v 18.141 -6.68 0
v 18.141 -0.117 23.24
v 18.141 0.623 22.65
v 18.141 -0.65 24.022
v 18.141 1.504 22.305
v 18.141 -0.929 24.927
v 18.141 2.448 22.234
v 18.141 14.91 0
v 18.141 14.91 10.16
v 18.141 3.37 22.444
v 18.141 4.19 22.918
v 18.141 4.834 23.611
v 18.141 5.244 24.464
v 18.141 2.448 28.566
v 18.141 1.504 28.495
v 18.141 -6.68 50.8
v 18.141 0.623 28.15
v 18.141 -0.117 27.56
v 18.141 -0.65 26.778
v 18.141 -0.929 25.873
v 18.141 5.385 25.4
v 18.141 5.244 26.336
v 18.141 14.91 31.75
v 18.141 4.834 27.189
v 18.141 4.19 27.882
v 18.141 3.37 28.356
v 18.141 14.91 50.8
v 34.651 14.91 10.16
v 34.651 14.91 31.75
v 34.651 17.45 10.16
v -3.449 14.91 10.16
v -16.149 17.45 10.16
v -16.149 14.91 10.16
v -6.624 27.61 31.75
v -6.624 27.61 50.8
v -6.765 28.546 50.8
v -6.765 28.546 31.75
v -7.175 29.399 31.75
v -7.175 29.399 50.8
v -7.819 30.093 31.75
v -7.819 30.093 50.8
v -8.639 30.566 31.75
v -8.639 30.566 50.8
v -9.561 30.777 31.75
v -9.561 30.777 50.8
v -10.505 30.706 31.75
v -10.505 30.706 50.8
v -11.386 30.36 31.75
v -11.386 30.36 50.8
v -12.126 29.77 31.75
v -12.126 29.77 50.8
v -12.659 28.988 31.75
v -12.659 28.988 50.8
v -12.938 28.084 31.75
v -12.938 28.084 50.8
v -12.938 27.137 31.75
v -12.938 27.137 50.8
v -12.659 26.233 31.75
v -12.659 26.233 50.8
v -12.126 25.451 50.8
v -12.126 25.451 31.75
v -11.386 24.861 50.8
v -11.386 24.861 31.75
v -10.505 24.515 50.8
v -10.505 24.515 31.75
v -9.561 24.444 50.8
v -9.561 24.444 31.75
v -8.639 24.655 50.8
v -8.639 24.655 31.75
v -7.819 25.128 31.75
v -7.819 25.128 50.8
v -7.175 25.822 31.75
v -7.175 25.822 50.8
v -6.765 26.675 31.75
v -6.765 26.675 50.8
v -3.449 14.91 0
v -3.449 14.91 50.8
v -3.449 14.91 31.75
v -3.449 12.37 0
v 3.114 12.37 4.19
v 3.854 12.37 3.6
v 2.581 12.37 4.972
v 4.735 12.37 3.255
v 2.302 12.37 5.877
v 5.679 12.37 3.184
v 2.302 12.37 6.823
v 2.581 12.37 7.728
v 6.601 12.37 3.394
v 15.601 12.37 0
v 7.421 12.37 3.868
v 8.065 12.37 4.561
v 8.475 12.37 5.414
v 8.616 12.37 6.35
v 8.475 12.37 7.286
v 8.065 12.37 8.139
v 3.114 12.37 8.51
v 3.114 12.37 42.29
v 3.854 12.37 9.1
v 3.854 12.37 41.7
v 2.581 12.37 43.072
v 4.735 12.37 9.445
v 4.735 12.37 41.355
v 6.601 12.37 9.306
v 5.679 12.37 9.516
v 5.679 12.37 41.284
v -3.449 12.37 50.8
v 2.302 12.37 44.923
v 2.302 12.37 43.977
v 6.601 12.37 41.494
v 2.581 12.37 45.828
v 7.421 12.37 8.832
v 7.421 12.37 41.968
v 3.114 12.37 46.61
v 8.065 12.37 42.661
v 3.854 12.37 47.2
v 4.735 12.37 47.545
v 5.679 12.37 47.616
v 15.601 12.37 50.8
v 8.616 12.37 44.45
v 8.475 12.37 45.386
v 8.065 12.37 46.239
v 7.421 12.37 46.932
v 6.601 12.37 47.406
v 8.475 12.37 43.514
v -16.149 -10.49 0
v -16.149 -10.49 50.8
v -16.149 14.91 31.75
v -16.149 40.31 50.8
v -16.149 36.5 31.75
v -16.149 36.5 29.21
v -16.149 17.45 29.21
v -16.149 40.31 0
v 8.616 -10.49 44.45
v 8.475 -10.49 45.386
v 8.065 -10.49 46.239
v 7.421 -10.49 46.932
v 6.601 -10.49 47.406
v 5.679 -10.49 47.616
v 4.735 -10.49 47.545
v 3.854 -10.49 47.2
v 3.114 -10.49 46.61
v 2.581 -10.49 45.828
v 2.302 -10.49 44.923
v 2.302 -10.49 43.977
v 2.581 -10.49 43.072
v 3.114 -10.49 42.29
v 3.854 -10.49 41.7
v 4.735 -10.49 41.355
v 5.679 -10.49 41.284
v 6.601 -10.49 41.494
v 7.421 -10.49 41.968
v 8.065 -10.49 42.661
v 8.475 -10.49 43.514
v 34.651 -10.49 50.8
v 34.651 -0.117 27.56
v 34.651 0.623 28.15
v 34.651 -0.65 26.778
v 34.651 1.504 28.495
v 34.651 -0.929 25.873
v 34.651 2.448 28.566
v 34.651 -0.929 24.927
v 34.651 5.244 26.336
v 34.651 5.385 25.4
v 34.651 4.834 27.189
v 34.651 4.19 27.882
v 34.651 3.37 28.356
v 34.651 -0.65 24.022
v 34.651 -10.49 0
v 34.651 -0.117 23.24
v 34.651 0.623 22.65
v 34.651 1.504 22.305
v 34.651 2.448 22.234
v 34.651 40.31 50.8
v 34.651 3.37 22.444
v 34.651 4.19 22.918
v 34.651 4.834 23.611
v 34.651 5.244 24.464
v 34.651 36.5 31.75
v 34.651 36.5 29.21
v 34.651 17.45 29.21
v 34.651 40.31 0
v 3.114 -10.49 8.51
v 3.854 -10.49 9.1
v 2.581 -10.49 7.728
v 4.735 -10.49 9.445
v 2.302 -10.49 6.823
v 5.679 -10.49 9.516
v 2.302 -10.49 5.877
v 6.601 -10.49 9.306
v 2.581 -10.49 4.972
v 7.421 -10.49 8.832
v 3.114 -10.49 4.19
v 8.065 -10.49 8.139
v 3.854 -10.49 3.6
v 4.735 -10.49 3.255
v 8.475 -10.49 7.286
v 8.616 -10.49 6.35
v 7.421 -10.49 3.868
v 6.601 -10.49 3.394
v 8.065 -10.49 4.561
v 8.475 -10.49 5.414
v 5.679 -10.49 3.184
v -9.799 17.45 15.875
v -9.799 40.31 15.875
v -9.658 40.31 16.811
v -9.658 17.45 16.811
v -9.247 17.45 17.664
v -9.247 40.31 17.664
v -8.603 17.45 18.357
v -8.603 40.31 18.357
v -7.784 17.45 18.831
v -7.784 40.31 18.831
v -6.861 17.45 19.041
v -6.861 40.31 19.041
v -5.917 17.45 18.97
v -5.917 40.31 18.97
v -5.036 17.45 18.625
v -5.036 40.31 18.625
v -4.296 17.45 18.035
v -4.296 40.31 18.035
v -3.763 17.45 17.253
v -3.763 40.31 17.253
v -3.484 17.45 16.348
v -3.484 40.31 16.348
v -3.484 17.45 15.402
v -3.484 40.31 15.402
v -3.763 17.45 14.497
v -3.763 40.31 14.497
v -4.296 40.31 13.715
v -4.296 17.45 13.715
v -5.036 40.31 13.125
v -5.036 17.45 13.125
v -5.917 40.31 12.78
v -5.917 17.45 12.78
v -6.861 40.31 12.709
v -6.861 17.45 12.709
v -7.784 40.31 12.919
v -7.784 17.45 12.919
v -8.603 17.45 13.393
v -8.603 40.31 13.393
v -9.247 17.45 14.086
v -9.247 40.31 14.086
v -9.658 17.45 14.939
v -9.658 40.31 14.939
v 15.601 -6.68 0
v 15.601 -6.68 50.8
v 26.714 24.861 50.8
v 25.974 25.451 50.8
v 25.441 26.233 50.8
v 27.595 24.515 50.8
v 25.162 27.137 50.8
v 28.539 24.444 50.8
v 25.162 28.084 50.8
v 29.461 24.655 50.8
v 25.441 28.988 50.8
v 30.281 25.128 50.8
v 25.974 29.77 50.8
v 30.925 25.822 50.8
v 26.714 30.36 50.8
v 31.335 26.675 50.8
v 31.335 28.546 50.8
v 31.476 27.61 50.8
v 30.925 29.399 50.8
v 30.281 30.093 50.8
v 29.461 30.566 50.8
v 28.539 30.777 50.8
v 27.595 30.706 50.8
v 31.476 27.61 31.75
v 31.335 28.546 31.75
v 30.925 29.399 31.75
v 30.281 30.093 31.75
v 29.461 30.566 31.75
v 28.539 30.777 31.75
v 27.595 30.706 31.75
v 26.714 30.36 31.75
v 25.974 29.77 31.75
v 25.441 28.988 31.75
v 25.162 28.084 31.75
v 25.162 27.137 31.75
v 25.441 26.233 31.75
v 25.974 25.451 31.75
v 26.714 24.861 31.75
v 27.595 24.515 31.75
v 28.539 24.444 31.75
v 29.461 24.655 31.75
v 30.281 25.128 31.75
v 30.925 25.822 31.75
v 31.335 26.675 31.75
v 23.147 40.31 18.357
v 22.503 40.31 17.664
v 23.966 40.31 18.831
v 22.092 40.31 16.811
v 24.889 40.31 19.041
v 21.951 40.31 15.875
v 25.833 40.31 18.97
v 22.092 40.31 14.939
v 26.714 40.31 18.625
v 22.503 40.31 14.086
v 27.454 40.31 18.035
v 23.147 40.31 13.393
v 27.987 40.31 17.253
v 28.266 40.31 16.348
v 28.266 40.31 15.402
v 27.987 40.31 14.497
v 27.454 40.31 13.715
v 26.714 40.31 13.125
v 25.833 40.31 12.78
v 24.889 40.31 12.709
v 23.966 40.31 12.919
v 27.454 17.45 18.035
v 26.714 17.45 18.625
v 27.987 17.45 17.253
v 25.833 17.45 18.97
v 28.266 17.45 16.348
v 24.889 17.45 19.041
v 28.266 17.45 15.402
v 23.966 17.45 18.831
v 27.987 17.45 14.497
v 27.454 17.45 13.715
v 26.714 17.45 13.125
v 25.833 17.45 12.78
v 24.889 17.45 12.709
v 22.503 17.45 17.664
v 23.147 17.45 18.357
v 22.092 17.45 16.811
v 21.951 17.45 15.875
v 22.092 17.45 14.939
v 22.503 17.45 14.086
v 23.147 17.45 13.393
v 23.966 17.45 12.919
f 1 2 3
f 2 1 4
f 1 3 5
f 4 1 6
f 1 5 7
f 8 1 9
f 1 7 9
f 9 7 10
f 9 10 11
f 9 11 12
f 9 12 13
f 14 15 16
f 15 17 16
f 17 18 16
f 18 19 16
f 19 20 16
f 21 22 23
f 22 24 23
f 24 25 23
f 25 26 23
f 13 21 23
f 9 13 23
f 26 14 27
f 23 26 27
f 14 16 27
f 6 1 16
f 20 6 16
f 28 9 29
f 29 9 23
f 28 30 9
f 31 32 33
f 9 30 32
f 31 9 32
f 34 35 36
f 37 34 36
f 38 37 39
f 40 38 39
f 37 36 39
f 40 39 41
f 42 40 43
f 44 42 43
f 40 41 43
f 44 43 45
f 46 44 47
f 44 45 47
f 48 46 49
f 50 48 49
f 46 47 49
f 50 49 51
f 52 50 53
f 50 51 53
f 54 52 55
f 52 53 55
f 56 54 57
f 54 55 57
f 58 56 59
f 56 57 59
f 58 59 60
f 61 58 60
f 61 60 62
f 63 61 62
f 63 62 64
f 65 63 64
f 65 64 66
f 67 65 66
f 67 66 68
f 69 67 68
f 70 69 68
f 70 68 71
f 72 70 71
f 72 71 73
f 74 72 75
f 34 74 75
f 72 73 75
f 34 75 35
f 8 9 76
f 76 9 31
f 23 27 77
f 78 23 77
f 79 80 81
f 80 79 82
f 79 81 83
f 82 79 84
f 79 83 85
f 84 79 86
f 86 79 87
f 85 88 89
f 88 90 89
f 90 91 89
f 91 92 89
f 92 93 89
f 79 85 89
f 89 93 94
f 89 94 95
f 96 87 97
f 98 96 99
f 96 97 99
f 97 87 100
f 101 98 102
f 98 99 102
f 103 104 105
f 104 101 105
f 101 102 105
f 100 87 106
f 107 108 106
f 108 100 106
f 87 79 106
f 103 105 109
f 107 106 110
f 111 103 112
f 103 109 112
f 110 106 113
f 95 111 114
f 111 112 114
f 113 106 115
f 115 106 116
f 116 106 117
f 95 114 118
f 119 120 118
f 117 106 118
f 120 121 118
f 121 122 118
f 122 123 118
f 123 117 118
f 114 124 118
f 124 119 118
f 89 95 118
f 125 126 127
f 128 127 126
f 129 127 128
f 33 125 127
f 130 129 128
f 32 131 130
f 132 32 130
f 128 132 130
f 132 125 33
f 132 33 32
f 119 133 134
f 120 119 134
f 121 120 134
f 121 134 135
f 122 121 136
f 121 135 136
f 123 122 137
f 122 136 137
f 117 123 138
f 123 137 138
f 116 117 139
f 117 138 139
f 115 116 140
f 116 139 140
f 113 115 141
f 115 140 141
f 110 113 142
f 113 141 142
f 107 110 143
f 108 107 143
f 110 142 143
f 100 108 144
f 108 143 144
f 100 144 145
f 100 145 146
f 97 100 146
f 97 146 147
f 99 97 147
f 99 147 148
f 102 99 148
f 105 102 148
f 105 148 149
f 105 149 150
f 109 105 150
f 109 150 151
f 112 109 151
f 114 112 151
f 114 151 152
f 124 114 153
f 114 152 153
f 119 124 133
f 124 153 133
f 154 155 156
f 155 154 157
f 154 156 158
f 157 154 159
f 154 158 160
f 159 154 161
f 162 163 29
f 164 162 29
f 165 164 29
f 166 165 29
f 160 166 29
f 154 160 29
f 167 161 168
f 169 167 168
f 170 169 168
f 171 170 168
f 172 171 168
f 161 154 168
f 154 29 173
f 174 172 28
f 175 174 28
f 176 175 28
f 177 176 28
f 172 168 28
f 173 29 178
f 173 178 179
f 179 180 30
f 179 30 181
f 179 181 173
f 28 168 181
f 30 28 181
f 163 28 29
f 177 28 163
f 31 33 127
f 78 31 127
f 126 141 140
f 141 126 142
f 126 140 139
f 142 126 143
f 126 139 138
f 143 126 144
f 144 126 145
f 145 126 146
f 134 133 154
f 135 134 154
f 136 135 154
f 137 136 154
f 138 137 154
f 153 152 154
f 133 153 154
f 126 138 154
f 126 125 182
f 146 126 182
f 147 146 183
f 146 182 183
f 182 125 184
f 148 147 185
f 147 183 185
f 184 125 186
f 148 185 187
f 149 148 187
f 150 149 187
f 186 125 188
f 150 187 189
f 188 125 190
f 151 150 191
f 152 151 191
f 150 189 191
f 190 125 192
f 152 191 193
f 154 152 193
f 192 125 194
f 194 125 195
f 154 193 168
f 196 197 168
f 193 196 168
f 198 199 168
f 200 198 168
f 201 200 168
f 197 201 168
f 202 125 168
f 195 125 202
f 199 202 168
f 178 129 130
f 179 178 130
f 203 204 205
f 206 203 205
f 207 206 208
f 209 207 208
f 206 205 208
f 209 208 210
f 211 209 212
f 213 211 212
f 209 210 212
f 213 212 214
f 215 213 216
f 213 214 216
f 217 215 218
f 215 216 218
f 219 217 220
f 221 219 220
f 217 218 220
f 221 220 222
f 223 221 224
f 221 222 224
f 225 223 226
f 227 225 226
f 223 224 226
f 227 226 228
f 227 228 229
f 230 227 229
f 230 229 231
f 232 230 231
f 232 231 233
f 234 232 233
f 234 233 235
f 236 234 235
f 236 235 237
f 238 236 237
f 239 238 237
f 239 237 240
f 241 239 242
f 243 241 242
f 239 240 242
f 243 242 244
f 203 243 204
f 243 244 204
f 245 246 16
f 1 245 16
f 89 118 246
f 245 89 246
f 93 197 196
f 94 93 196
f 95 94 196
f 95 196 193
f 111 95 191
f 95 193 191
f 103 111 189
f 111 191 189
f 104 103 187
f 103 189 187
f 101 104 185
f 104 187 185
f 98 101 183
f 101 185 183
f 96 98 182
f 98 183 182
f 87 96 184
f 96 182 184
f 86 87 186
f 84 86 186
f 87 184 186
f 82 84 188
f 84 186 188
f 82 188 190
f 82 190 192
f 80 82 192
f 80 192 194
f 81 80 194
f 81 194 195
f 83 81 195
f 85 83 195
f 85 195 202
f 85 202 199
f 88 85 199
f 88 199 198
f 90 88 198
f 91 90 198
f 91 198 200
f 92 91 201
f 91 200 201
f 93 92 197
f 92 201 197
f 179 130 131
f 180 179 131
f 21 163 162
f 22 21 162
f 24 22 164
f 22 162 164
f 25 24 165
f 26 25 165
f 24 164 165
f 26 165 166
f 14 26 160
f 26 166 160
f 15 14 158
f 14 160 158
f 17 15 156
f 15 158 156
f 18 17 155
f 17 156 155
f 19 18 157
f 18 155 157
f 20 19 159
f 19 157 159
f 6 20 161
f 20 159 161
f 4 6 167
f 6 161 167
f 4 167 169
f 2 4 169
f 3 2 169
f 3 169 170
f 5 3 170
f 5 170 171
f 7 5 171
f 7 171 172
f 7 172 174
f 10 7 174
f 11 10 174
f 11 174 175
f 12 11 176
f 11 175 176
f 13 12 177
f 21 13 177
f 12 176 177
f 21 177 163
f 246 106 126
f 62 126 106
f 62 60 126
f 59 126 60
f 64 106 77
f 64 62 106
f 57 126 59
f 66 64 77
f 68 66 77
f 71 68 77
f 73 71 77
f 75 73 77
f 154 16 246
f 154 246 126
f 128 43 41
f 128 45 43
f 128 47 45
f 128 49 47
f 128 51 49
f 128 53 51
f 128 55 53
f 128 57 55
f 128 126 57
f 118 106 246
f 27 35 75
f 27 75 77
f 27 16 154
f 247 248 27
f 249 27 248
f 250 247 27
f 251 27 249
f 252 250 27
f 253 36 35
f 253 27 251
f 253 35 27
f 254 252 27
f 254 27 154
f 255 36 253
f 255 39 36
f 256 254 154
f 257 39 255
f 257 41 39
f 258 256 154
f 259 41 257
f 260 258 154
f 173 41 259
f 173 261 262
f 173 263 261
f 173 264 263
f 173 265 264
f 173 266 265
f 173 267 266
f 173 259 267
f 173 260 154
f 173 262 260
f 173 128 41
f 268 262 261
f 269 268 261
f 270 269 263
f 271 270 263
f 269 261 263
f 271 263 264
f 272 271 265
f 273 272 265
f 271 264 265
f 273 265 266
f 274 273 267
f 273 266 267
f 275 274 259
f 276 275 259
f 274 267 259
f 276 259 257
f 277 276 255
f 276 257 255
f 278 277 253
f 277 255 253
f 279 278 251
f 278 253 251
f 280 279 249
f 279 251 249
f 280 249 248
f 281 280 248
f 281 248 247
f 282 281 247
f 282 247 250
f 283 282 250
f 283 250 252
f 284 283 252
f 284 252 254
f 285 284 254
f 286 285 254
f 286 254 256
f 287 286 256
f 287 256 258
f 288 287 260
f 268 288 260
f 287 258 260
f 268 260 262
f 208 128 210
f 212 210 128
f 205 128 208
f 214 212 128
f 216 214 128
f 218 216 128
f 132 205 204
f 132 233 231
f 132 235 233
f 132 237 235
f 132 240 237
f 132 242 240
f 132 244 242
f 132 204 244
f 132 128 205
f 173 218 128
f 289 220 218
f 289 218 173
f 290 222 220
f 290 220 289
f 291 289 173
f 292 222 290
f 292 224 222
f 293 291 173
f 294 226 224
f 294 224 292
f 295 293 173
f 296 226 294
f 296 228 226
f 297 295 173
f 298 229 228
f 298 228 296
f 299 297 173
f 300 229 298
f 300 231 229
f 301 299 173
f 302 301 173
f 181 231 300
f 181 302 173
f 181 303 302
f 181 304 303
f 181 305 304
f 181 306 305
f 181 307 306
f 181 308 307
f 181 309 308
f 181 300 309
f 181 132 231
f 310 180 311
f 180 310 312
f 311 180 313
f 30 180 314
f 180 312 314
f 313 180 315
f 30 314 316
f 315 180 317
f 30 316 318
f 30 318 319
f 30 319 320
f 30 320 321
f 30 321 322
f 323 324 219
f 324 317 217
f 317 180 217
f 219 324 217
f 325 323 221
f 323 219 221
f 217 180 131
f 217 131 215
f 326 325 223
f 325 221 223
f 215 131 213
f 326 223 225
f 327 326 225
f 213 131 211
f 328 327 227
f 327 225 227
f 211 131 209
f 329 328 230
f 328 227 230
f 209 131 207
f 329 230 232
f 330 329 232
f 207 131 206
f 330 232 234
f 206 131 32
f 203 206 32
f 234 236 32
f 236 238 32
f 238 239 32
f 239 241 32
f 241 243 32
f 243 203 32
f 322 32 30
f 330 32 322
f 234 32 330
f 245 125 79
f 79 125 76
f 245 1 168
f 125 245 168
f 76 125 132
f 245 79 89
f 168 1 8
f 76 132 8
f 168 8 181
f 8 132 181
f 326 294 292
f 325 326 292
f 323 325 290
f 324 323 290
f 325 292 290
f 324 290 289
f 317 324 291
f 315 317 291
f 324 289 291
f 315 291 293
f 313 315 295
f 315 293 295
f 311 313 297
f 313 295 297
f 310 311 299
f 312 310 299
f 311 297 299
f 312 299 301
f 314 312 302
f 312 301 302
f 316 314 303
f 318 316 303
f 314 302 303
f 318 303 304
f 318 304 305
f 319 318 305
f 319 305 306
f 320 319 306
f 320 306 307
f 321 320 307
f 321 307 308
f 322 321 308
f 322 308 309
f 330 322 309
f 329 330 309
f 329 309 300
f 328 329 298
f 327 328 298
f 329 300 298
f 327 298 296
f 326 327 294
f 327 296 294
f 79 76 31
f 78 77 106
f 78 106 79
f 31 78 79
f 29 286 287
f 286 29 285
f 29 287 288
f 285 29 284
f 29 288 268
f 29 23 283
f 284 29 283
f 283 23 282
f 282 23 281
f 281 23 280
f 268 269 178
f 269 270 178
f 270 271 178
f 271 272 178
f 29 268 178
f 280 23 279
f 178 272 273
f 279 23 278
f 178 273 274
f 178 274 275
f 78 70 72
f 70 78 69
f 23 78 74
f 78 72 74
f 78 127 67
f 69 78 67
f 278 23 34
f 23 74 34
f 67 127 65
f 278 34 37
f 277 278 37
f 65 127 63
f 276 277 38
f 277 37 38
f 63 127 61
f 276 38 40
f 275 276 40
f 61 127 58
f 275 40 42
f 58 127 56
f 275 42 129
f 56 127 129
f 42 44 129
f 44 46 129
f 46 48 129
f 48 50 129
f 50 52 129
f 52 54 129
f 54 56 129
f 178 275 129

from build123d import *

# Parameters (mm, degrees)
F0_W      = 50.8
F0_H      = 50.8
F1_DEPTH  = 50.8
F3_DEPTH  = 50.8
F5_DEPTH  = 50.8
F6_R      = 3.175
F7_DEPTH  = 22.86
F8_R      = 3.175
F9_DEPTH  = 16.51
F10_R     = 3.175
F11_DEPTH = 19.05
F12_R     = 3.175
F13_DEPTH = 22.86


with BuildPart() as f1:
    # F0 (on Top) → F1 (new body)
    with BuildSketch(Plane.XY):
        with Locations((9.251333, 14.910408)):
            Rectangle(F0_W, F0_H)
    extrude(amount=F1_DEPTH)

    # F2 (on face) → F3 (cut, through all)
    with BuildSketch(Plane.XY.offset(50.8)):
        Polygon((-3.448667, 14.910408), (-3.448667, 12.370408), (15.601333, 12.370408), (15.601333, -6.679592), (18.141333, -6.679592), (18.141333, 14.910408), align=None)
    extrude(amount=-F3_DEPTH, mode=Mode.SUBTRACT)

    # F4 (on face) → F5 (cut, through all)
    with BuildSketch(Plane(origin=(-16.148667, 0, 0), x_dir=(0, -1, 0), z_dir=(-1, 0, 0))):
        Polygon((-14.910408, 10.16), (-14.910408, 31.75), (-36.500408, 31.75), (-36.500408, 29.21), (-17.450408, 29.21), (-17.450408, 10.16), align=None)
    extrude(amount=-F5_DEPTH, mode=Mode.SUBTRACT)

    # F6 (on face) → F7 (cut, through all)
    with BuildSketch(Plane.XZ.offset(10.489592)):
        with Locations((5.441333, 44.45)):
            Circle(F6_R)
        with Locations((5.441333, 6.35)):
            Circle(F6_R)
    extrude(amount=-F7_DEPTH, mode=Mode.SUBTRACT)

    # F8 (on face) → F9 (cut, through all)
    with BuildSketch(Plane.YZ.offset(34.651333)):
        with Locations((2.210408, 25.4)):
            Circle(F8_R)
    extrude(amount=-F9_DEPTH, mode=Mode.SUBTRACT)

    # F10 (on face) → F11 (cut, through all)
    with BuildSketch(Plane.XY.offset(50.8)):
        with Locations((28.301333, 27.610408)):
            Circle(F10_R)
        with Locations((-9.798667, 27.610408)):
            Circle(F10_R)
    extrude(amount=-F11_DEPTH, mode=Mode.SUBTRACT)

    # F12 (on face) → F13 (cut, through all)
    with BuildSketch(Plane(origin=(0, 40.310408, 0), x_dir=(-1, 0, 0), z_dir=(0, 1, 0))):
        with Locations((-25.126333, 15.875)):
            Circle(F12_R)
        with Locations((6.623667, 15.875)):
            Circle(F12_R)
    extrude(amount=-F13_DEPTH, mode=Mode.SUBTRACT)


solid = f1.part
